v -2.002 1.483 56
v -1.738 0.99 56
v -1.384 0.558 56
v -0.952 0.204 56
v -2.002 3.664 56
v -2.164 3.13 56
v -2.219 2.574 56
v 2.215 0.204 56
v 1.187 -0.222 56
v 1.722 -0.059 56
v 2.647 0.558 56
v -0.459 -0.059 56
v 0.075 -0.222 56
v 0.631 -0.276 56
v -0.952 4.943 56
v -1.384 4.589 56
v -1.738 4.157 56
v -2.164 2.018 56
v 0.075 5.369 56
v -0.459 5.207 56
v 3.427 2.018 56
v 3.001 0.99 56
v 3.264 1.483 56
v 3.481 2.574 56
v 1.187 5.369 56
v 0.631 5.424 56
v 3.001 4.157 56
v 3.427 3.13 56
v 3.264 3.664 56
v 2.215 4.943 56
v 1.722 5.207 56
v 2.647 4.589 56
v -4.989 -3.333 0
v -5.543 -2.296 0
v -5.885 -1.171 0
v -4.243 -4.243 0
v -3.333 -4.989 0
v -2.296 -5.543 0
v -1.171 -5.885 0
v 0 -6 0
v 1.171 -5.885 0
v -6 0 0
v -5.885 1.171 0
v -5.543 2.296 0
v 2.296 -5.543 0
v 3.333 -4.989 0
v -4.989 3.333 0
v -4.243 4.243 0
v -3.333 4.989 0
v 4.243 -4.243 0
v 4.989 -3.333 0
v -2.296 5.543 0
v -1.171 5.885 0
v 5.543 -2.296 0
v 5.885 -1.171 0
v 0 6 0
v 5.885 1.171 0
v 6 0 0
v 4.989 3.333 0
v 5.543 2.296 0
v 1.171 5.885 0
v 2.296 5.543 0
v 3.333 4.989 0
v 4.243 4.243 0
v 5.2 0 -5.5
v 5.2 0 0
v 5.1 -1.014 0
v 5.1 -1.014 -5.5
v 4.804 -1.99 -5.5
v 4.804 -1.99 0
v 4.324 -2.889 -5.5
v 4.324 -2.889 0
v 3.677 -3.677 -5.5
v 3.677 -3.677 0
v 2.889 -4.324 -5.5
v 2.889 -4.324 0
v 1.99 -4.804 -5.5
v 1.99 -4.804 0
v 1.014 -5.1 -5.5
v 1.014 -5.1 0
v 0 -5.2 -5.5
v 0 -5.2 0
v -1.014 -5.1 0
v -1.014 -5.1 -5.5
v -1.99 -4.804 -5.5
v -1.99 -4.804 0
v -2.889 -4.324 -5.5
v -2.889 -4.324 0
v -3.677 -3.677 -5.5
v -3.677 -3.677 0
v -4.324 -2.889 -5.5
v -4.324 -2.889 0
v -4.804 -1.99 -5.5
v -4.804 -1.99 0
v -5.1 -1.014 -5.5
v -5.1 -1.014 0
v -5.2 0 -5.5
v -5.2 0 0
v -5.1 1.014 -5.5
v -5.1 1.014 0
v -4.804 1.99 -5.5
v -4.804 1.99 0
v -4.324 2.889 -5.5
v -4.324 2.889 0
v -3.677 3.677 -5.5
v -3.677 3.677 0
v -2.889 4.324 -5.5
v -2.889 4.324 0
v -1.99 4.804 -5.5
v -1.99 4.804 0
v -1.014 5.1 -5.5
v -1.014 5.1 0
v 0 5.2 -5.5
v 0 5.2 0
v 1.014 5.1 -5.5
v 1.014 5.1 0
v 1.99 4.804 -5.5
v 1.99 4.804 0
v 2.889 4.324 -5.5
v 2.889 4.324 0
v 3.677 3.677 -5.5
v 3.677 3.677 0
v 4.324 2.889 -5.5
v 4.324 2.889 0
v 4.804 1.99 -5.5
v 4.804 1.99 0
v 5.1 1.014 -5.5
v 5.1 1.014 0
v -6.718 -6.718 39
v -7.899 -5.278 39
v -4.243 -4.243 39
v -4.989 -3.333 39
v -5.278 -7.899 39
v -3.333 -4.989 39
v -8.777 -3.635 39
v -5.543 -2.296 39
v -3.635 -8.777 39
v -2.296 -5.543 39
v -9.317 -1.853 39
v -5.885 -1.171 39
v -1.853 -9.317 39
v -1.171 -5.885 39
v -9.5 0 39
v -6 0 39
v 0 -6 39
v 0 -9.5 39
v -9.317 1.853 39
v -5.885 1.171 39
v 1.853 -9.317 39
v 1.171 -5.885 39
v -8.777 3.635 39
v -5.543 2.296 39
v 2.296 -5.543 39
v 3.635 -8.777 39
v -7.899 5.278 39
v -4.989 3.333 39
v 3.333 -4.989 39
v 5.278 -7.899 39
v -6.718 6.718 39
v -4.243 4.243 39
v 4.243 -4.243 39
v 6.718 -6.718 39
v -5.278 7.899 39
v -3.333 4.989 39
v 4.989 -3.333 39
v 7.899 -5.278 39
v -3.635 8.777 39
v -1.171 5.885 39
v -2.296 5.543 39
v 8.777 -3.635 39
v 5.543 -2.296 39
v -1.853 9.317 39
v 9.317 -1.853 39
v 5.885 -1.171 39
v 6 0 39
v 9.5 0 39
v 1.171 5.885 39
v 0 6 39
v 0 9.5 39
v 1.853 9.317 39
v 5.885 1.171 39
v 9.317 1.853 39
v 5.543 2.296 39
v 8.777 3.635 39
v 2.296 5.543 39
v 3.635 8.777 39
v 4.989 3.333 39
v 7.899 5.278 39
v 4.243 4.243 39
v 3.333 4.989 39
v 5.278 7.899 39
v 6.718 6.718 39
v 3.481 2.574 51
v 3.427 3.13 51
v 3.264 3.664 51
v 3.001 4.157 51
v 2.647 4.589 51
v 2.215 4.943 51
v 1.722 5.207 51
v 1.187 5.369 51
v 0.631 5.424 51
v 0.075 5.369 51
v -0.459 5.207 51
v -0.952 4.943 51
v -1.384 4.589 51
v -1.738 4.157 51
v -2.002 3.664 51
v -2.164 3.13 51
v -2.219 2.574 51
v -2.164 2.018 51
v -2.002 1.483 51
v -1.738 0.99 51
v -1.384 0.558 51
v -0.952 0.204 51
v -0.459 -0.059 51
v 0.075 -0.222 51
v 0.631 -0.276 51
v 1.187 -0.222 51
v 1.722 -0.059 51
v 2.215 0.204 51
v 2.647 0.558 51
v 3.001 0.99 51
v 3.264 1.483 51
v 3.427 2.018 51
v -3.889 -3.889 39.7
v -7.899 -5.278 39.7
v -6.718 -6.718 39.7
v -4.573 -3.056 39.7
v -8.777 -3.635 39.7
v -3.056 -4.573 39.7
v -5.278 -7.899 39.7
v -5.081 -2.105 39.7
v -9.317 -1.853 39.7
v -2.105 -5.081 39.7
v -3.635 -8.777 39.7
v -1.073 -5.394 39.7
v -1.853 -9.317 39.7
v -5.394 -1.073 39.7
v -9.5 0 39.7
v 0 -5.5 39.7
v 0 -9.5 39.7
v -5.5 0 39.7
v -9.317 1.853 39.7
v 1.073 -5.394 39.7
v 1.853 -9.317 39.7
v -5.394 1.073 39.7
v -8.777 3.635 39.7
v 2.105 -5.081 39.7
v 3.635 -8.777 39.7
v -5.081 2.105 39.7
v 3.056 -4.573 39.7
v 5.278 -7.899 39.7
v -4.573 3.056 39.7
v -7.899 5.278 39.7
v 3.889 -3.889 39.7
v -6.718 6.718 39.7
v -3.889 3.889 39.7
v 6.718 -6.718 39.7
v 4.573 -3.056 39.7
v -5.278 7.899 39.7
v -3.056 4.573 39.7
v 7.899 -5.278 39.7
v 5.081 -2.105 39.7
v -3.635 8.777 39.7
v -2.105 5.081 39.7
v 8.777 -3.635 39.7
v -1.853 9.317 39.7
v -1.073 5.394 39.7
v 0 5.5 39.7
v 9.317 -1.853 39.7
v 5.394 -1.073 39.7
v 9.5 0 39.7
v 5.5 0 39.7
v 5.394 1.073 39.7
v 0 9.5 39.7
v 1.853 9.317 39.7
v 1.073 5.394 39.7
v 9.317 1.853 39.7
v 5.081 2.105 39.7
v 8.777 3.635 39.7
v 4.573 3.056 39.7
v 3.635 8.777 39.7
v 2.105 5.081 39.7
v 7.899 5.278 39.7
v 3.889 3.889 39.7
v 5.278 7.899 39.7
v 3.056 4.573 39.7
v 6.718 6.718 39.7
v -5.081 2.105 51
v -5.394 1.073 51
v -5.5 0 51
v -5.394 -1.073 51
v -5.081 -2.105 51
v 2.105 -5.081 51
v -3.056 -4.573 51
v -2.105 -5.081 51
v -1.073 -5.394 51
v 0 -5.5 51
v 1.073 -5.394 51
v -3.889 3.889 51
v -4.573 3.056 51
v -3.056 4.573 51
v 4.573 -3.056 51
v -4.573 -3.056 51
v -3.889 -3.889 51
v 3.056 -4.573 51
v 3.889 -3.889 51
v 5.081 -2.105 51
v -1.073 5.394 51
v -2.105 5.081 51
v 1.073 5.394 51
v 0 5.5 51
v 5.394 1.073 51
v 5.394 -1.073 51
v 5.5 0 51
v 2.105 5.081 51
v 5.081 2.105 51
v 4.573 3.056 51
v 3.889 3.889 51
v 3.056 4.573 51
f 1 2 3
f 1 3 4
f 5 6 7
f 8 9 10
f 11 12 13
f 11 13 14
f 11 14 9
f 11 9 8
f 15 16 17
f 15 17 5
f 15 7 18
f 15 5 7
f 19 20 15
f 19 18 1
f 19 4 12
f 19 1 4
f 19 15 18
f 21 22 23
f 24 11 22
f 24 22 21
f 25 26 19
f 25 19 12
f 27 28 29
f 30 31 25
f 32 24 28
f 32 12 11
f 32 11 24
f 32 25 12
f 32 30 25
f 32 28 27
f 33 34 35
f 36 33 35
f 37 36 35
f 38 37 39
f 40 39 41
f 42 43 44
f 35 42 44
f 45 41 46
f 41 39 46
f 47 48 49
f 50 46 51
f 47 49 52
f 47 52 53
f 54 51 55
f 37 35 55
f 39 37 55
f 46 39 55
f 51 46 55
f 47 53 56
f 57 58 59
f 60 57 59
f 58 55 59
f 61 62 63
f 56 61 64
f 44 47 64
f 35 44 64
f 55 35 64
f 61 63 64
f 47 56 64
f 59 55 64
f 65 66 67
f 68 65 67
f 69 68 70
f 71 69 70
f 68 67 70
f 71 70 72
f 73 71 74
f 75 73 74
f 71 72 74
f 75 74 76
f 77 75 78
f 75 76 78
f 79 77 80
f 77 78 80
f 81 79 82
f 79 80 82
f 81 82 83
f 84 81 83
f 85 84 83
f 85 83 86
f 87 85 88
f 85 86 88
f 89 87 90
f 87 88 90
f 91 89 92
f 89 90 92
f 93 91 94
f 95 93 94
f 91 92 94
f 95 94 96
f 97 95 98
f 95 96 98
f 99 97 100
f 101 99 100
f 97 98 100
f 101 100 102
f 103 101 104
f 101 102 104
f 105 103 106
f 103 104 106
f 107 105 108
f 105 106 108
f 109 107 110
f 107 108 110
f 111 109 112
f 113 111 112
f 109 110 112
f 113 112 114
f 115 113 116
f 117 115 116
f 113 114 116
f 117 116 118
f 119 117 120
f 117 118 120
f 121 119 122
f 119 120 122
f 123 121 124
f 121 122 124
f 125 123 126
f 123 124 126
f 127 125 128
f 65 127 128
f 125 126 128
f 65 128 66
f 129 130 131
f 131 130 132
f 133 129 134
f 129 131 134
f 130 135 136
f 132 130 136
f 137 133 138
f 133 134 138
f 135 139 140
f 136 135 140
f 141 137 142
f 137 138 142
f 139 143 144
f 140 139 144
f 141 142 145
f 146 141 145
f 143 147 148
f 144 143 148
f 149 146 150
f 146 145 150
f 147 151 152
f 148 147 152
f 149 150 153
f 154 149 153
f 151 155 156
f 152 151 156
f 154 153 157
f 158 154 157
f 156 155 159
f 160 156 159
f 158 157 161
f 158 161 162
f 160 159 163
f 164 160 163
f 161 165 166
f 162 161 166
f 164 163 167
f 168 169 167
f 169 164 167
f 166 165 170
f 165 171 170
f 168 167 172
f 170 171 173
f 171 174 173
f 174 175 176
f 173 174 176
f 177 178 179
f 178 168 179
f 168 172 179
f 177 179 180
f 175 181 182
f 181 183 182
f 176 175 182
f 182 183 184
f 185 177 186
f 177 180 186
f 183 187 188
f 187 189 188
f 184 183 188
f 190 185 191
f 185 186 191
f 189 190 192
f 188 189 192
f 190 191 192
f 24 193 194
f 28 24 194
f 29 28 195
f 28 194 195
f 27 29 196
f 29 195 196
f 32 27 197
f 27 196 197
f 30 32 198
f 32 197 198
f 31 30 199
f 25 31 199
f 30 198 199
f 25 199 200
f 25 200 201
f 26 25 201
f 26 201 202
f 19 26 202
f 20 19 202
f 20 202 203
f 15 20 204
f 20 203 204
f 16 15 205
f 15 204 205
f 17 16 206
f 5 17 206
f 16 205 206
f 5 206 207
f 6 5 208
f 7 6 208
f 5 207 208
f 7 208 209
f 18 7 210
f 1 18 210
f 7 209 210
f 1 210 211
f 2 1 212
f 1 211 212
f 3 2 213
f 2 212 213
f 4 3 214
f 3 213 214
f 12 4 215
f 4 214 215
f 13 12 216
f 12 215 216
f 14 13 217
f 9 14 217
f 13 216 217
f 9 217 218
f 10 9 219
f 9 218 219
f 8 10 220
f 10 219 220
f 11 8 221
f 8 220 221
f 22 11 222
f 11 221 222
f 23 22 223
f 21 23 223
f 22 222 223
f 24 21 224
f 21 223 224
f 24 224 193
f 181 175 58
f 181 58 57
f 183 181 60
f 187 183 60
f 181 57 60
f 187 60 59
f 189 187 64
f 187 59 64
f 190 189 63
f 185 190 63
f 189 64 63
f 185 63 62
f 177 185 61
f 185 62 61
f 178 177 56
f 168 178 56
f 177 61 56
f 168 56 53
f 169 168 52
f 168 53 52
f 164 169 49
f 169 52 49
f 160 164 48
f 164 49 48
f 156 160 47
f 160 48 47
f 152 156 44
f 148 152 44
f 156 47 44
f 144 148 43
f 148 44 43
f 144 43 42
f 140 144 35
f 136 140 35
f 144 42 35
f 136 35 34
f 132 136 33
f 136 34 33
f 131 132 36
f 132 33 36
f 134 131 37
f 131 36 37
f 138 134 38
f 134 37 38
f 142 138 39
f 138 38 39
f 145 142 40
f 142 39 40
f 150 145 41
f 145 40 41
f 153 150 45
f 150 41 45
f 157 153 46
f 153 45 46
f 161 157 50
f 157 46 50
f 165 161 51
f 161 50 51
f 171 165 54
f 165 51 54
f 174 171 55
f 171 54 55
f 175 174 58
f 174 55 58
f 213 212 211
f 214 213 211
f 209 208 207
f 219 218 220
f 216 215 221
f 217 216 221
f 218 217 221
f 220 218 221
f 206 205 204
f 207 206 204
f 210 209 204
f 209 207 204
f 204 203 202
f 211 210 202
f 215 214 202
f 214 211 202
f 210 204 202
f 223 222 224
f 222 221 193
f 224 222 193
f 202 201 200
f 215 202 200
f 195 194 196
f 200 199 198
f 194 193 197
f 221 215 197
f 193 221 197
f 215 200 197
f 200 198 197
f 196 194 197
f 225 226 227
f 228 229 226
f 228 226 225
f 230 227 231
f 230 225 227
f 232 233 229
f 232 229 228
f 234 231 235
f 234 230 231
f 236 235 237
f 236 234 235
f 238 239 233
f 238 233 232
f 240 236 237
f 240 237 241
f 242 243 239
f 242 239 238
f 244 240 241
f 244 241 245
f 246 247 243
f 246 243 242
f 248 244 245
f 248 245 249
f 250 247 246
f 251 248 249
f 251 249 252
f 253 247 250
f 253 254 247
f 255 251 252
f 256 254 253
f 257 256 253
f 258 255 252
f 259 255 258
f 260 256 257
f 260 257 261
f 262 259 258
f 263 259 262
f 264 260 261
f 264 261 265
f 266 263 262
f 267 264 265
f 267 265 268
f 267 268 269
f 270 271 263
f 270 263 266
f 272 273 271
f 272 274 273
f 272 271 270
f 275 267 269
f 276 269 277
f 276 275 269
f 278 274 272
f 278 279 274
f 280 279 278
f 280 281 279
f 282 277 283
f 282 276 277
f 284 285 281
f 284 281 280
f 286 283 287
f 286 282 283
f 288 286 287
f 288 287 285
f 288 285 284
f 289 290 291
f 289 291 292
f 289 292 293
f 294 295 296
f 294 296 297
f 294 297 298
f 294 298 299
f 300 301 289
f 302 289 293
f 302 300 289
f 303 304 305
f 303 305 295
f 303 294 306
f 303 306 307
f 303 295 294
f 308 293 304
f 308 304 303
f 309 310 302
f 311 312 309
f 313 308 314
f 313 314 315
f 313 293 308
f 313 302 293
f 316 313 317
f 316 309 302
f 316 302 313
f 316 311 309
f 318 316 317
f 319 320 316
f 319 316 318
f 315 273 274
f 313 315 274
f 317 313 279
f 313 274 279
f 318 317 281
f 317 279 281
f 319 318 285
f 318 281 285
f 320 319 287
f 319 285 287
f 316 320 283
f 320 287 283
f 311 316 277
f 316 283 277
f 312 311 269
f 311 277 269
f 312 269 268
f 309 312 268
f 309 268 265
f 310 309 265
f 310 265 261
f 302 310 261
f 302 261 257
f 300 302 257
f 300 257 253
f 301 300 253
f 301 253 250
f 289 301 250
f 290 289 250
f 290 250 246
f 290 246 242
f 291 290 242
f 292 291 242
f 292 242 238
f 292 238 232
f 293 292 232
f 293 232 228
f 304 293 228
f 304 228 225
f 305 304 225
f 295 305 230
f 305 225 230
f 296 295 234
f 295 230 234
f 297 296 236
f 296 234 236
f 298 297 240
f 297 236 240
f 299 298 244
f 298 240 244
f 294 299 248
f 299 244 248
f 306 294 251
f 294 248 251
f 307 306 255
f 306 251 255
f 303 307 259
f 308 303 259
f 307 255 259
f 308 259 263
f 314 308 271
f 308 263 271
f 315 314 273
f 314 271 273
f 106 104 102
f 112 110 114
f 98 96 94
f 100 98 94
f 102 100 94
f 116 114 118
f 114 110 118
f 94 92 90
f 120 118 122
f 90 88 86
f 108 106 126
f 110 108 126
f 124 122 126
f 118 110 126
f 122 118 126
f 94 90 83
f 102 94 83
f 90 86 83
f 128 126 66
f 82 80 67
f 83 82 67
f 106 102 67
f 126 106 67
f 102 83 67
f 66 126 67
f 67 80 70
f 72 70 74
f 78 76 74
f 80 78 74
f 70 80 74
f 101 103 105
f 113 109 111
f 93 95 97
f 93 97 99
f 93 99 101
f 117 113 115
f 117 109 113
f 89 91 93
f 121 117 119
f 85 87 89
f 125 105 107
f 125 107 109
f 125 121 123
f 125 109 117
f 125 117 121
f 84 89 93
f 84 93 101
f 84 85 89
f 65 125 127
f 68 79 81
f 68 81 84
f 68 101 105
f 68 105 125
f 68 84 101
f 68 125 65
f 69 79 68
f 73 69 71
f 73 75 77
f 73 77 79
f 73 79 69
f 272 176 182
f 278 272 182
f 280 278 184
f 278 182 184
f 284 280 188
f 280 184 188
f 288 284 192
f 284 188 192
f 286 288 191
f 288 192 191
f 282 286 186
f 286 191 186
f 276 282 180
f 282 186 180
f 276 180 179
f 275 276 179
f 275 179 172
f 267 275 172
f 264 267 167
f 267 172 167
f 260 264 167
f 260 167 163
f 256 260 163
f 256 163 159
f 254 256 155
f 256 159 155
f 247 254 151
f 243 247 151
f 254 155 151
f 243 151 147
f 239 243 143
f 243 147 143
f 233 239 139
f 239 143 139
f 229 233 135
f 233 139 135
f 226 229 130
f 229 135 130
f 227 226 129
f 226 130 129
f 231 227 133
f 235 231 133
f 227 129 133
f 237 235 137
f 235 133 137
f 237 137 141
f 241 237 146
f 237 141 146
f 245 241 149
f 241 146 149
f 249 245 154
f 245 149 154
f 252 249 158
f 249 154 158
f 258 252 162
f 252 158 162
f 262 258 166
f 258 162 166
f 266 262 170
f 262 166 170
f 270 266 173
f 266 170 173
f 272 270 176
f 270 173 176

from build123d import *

# Parameters (mm, degrees)
F0_R     = 6
F1_DEPTH = 39
F2_R     = 5.5
F3_DEPTH = 12
F4_R     = 5.2
F5_DEPTH = 5.5
F6_R     = 2.85
F7_DEPTH = 5
F8_R     = 9.5
F9_DEPTH = 0.7


with BuildPart() as f1:
    # F0 (on Top) → F1 (new body)
    with BuildSketch(Plane.XY):
        Circle(F0_R)
    extrude(amount=F1_DEPTH)

    # F2 (on face) → F3 (join)
    with BuildSketch(Plane.XY.offset(39)):
        Circle(F2_R)
    extrude(amount=F3_DEPTH)

    # F8 (on face) → F9 (join)
    with BuildSketch(Plane.XY.offset(39)):
        Circle(F8_R)
    extrude(amount=F9_DEPTH)


with BuildPart() as f5:
    # F4 (on face) → F5 (new body)
    with BuildSketch(Plane(origin=(0, 0, 0), x_dir=(1, 0, 0), z_dir=(0, 0, -1))):
        Circle(F4_R)
    extrude(amount=F5_DEPTH)


with BuildPart() as f7:
    # F6 (on face) → F7 (new body)
    with BuildSketch(Plane.XY.offset(51)):
        with Locations((0.631265, 2.573714)):
            Circle(F6_R)
    extrude(amount=F7_DEPTH)


solid = Compound([f1.part, f5.part, f7.part])
